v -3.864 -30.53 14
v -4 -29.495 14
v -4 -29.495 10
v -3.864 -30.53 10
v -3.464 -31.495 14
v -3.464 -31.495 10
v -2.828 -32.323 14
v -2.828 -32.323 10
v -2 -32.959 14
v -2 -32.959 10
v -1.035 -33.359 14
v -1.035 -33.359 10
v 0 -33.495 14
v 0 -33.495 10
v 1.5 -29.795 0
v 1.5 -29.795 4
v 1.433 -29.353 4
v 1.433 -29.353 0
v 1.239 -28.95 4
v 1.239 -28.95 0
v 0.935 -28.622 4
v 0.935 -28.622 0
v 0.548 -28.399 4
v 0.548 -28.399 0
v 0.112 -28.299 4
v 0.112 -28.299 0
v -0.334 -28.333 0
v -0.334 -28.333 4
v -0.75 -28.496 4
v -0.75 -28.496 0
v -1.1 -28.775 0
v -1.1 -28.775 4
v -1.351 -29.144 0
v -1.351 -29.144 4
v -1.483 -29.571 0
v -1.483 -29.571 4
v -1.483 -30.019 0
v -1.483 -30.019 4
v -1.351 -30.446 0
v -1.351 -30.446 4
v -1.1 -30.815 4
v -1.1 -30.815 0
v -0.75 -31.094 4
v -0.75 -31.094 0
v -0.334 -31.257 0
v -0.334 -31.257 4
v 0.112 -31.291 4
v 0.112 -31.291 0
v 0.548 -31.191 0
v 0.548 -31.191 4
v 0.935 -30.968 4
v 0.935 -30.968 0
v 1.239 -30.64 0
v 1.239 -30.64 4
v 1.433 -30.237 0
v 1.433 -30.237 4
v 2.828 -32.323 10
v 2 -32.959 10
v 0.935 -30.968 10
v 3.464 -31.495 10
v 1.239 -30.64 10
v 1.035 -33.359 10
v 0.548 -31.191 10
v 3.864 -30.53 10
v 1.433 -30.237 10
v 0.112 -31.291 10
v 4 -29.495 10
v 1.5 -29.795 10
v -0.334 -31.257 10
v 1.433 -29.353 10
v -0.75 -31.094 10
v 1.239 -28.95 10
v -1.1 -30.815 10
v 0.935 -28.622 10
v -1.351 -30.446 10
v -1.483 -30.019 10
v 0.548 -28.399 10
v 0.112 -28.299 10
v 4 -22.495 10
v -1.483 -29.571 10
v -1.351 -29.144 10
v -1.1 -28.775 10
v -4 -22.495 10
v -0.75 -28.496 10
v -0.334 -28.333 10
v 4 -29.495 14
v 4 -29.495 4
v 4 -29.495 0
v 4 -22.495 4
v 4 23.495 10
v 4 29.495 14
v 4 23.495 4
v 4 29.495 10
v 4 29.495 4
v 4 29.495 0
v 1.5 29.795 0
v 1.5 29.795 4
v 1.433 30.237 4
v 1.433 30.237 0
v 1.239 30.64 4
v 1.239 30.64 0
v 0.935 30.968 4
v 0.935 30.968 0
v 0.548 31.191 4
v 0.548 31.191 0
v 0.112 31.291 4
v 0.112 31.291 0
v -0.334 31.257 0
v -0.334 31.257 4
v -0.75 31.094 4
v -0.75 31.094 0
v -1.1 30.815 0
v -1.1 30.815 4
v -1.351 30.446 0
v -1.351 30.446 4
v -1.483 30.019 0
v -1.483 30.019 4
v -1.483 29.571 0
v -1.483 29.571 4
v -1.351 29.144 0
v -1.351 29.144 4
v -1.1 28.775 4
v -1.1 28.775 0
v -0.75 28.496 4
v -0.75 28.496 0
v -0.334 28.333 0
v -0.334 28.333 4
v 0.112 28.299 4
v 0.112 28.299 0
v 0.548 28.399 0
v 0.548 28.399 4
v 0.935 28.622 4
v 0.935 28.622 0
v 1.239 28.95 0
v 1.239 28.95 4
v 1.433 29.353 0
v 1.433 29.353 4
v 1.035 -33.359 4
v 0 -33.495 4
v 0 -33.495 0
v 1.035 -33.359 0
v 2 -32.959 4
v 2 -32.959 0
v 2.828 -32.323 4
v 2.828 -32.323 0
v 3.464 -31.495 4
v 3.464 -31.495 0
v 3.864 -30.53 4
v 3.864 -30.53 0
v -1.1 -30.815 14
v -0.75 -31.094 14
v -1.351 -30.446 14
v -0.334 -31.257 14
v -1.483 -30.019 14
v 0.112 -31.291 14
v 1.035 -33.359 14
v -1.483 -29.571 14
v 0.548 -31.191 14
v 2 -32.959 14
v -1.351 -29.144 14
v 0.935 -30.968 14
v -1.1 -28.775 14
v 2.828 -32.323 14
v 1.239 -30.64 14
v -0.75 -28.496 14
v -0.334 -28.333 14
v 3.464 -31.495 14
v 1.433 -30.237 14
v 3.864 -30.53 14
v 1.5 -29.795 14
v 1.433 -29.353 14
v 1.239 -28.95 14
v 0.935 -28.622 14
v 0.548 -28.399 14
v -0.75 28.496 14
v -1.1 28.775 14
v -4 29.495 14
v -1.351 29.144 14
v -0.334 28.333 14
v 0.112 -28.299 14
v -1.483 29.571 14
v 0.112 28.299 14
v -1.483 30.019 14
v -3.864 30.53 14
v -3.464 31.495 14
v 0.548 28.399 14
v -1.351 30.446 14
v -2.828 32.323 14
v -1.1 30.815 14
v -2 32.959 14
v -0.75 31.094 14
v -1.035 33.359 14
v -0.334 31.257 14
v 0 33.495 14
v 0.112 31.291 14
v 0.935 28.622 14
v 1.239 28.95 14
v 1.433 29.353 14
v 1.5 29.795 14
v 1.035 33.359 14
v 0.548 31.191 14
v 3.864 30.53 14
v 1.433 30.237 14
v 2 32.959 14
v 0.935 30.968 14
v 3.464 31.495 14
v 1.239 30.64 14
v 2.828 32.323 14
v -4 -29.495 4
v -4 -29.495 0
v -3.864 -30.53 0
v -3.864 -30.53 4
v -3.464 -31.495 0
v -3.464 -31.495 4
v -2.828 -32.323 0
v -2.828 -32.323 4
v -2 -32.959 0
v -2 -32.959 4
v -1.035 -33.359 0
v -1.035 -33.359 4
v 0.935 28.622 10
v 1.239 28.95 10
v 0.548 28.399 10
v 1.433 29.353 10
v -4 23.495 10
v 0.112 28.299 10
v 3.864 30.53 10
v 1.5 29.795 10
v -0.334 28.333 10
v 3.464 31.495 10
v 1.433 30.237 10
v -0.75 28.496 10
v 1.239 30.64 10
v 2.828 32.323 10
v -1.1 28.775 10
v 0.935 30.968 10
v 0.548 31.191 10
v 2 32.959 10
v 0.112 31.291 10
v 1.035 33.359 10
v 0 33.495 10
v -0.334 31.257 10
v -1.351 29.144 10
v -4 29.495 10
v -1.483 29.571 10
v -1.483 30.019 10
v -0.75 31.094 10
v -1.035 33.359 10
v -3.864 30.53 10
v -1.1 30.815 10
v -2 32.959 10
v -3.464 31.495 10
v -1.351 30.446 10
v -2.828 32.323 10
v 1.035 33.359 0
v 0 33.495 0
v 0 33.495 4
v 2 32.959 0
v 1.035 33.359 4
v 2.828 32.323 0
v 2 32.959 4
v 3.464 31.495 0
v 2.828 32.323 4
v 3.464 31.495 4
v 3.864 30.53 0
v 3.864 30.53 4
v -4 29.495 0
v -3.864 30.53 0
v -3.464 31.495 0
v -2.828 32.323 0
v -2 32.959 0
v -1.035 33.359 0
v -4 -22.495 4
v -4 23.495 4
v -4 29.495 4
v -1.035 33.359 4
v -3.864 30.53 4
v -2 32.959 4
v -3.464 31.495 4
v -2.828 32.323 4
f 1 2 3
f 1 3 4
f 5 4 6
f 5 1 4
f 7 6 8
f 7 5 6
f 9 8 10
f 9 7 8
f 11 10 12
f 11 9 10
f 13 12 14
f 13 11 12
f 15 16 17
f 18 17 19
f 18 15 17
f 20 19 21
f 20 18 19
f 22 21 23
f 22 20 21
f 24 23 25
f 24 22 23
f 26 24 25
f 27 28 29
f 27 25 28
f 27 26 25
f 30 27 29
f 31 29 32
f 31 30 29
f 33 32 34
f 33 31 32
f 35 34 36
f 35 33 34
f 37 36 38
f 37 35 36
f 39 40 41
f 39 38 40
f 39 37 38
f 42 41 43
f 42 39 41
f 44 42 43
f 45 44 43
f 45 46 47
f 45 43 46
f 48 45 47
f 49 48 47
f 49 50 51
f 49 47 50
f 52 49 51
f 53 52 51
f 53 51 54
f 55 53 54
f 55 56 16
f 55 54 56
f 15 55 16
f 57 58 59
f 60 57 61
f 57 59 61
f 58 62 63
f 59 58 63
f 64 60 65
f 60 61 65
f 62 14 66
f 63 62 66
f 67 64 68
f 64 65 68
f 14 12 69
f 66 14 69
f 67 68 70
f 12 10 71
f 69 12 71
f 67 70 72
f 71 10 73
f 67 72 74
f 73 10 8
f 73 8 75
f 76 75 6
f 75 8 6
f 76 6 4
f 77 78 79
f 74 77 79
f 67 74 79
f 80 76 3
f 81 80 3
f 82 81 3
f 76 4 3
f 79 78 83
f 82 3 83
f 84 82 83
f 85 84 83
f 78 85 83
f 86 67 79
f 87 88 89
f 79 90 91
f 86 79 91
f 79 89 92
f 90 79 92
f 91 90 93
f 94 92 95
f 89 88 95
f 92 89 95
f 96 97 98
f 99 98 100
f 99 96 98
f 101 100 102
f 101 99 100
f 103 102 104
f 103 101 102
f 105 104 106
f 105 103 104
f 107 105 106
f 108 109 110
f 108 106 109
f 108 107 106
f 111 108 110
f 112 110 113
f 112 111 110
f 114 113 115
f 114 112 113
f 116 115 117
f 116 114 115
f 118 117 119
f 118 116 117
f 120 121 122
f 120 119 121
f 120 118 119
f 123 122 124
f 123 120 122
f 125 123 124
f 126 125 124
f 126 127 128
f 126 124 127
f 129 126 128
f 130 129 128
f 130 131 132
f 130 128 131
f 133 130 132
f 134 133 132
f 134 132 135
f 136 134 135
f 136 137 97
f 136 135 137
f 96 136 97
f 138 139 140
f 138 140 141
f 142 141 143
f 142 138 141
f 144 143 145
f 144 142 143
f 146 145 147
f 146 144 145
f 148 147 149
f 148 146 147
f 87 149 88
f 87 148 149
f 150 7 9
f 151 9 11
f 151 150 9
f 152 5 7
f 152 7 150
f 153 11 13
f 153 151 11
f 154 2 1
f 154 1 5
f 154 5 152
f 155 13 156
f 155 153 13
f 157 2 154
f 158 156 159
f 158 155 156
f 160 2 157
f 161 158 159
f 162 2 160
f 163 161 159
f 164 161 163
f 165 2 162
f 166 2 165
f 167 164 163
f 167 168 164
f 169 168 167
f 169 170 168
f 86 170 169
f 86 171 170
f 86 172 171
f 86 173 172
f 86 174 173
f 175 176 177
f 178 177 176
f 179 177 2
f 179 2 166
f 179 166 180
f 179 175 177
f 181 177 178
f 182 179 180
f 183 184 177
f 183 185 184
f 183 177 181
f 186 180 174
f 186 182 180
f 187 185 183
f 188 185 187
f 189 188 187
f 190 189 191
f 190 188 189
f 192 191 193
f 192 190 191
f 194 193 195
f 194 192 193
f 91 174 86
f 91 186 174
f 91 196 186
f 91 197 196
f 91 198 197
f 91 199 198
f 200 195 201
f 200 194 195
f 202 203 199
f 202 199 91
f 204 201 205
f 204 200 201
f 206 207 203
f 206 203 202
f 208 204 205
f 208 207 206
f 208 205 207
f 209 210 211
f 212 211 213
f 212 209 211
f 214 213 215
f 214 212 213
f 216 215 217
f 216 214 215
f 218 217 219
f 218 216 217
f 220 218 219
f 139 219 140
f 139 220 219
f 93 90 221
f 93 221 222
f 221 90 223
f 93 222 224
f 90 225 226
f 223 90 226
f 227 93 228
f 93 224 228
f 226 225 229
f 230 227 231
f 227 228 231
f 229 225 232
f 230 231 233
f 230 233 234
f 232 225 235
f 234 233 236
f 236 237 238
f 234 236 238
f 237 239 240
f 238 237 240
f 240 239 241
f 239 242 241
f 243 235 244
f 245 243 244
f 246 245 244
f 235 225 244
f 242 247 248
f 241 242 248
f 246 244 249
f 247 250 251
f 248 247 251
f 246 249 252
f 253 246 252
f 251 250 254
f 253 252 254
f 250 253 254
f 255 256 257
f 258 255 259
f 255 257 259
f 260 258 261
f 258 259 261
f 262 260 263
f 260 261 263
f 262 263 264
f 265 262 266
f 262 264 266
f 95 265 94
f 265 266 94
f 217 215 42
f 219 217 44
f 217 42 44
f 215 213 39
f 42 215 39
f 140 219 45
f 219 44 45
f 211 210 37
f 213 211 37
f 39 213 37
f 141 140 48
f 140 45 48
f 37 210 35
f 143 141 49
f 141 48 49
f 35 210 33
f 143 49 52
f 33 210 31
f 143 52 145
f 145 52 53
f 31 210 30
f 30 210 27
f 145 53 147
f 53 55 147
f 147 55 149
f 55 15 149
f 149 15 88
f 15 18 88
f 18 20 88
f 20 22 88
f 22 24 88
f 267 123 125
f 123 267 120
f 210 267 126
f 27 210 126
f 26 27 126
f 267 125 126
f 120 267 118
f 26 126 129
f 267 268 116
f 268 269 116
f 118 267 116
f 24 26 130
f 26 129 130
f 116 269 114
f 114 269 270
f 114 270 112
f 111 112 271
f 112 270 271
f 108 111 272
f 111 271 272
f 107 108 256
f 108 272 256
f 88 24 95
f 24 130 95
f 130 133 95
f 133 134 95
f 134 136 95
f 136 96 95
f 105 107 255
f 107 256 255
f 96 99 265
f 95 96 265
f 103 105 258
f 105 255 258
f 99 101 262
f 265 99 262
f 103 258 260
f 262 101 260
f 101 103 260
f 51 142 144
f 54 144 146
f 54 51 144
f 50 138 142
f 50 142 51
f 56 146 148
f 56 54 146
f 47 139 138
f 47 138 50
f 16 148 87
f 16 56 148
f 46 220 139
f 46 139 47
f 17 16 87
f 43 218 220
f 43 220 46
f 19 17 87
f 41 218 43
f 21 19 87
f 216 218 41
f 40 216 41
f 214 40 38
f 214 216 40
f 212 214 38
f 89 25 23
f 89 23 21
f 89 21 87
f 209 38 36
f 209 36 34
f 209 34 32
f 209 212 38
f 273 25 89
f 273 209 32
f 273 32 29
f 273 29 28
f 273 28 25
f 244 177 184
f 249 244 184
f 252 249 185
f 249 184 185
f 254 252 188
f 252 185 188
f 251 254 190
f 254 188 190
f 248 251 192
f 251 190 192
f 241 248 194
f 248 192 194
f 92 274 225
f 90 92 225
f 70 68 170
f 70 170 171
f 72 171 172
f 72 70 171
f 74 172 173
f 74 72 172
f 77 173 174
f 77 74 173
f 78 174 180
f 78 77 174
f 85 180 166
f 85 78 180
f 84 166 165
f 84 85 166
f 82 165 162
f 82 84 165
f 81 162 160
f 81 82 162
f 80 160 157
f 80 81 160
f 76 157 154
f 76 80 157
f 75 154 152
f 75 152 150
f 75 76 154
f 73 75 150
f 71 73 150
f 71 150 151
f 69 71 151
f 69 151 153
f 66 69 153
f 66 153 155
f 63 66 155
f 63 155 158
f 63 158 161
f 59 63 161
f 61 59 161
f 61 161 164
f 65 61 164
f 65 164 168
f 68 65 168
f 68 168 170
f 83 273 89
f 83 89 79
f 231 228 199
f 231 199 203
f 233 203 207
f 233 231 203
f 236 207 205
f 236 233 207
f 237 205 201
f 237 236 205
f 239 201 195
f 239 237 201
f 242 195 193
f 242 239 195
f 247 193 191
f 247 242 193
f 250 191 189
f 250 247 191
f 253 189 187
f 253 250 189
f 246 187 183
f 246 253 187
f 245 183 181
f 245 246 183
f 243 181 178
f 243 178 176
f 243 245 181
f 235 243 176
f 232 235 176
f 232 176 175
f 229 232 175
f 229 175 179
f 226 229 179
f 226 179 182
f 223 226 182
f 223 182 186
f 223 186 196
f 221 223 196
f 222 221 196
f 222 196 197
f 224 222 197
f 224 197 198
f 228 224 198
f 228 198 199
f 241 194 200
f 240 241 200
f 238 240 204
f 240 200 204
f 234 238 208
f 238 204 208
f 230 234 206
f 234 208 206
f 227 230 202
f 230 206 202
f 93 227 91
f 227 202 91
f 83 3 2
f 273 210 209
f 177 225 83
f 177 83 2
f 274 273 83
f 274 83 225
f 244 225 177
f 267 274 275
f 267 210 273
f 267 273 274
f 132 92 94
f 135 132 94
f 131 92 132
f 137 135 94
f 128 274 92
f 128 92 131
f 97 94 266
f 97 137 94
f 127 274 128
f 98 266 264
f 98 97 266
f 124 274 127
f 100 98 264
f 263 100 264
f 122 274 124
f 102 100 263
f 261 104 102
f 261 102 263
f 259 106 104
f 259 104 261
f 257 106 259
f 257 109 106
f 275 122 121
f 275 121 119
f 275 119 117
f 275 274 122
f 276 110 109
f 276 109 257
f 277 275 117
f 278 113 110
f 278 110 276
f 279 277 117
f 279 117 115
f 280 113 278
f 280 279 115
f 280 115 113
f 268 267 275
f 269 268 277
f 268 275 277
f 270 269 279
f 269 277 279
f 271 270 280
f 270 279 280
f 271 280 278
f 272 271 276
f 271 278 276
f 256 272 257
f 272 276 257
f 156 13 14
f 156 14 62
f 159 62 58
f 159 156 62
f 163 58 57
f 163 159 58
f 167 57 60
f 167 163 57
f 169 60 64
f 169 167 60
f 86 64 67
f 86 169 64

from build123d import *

# Parameters (mm, degrees)
SKETCH1_W           = 8
SKETCH1_H           = 66.99
SKETCH1_R           = 1.5
BOSS_EXTRUDE1_DEPTH = 14
FILLET1_R           = 4
SKETCH2_W           = 6
SKETCH2_H           = 10
SKETCH2_H_2         = 11
CUT_EXTRUDE1_DEPTH  = 38.174117676


with BuildPart() as part:
    # Sketch1 → Boss-Extrude1 (new body)
    with BuildSketch(Plane.XY):
        Rectangle(SKETCH1_W, SKETCH1_H)
        with Locations((0, 29.795)):
            Circle(SKETCH1_R, mode=Mode.SUBTRACT)
        with Locations((0, -29.795)):
            Circle(SKETCH1_R, mode=Mode.SUBTRACT)
    extrude(amount=BOSS_EXTRUDE1_DEPTH)

    # Fillet1
    fillet1_edges = [part.edges().sort_by_distance(p)[0] for p in [
        (-4, -33.495, 7),
        (4, -33.495, 7),
        (-4, 33.495, 7),
        (4, 33.495, 7),
    ]]
    fillet(fillet1_edges, radius=FILLET1_R - 0.0001)  # a hair under: the kernel refuses the full size

    # Sketch2 → Cut-Extrude1 (cut, through all)
    with BuildSketch(Plane.ZY.offset(4)):
        with Locations((7, 28.495)):
            Rectangle(SKETCH2_W, SKETCH2_H)
        with Locations((7, -27.995)):
            Rectangle(SKETCH2_W, SKETCH2_H_2)
    extrude(amount=-CUT_EXTRUDE1_DEPTH, mode=Mode.SUBTRACT)


solid = part.part
